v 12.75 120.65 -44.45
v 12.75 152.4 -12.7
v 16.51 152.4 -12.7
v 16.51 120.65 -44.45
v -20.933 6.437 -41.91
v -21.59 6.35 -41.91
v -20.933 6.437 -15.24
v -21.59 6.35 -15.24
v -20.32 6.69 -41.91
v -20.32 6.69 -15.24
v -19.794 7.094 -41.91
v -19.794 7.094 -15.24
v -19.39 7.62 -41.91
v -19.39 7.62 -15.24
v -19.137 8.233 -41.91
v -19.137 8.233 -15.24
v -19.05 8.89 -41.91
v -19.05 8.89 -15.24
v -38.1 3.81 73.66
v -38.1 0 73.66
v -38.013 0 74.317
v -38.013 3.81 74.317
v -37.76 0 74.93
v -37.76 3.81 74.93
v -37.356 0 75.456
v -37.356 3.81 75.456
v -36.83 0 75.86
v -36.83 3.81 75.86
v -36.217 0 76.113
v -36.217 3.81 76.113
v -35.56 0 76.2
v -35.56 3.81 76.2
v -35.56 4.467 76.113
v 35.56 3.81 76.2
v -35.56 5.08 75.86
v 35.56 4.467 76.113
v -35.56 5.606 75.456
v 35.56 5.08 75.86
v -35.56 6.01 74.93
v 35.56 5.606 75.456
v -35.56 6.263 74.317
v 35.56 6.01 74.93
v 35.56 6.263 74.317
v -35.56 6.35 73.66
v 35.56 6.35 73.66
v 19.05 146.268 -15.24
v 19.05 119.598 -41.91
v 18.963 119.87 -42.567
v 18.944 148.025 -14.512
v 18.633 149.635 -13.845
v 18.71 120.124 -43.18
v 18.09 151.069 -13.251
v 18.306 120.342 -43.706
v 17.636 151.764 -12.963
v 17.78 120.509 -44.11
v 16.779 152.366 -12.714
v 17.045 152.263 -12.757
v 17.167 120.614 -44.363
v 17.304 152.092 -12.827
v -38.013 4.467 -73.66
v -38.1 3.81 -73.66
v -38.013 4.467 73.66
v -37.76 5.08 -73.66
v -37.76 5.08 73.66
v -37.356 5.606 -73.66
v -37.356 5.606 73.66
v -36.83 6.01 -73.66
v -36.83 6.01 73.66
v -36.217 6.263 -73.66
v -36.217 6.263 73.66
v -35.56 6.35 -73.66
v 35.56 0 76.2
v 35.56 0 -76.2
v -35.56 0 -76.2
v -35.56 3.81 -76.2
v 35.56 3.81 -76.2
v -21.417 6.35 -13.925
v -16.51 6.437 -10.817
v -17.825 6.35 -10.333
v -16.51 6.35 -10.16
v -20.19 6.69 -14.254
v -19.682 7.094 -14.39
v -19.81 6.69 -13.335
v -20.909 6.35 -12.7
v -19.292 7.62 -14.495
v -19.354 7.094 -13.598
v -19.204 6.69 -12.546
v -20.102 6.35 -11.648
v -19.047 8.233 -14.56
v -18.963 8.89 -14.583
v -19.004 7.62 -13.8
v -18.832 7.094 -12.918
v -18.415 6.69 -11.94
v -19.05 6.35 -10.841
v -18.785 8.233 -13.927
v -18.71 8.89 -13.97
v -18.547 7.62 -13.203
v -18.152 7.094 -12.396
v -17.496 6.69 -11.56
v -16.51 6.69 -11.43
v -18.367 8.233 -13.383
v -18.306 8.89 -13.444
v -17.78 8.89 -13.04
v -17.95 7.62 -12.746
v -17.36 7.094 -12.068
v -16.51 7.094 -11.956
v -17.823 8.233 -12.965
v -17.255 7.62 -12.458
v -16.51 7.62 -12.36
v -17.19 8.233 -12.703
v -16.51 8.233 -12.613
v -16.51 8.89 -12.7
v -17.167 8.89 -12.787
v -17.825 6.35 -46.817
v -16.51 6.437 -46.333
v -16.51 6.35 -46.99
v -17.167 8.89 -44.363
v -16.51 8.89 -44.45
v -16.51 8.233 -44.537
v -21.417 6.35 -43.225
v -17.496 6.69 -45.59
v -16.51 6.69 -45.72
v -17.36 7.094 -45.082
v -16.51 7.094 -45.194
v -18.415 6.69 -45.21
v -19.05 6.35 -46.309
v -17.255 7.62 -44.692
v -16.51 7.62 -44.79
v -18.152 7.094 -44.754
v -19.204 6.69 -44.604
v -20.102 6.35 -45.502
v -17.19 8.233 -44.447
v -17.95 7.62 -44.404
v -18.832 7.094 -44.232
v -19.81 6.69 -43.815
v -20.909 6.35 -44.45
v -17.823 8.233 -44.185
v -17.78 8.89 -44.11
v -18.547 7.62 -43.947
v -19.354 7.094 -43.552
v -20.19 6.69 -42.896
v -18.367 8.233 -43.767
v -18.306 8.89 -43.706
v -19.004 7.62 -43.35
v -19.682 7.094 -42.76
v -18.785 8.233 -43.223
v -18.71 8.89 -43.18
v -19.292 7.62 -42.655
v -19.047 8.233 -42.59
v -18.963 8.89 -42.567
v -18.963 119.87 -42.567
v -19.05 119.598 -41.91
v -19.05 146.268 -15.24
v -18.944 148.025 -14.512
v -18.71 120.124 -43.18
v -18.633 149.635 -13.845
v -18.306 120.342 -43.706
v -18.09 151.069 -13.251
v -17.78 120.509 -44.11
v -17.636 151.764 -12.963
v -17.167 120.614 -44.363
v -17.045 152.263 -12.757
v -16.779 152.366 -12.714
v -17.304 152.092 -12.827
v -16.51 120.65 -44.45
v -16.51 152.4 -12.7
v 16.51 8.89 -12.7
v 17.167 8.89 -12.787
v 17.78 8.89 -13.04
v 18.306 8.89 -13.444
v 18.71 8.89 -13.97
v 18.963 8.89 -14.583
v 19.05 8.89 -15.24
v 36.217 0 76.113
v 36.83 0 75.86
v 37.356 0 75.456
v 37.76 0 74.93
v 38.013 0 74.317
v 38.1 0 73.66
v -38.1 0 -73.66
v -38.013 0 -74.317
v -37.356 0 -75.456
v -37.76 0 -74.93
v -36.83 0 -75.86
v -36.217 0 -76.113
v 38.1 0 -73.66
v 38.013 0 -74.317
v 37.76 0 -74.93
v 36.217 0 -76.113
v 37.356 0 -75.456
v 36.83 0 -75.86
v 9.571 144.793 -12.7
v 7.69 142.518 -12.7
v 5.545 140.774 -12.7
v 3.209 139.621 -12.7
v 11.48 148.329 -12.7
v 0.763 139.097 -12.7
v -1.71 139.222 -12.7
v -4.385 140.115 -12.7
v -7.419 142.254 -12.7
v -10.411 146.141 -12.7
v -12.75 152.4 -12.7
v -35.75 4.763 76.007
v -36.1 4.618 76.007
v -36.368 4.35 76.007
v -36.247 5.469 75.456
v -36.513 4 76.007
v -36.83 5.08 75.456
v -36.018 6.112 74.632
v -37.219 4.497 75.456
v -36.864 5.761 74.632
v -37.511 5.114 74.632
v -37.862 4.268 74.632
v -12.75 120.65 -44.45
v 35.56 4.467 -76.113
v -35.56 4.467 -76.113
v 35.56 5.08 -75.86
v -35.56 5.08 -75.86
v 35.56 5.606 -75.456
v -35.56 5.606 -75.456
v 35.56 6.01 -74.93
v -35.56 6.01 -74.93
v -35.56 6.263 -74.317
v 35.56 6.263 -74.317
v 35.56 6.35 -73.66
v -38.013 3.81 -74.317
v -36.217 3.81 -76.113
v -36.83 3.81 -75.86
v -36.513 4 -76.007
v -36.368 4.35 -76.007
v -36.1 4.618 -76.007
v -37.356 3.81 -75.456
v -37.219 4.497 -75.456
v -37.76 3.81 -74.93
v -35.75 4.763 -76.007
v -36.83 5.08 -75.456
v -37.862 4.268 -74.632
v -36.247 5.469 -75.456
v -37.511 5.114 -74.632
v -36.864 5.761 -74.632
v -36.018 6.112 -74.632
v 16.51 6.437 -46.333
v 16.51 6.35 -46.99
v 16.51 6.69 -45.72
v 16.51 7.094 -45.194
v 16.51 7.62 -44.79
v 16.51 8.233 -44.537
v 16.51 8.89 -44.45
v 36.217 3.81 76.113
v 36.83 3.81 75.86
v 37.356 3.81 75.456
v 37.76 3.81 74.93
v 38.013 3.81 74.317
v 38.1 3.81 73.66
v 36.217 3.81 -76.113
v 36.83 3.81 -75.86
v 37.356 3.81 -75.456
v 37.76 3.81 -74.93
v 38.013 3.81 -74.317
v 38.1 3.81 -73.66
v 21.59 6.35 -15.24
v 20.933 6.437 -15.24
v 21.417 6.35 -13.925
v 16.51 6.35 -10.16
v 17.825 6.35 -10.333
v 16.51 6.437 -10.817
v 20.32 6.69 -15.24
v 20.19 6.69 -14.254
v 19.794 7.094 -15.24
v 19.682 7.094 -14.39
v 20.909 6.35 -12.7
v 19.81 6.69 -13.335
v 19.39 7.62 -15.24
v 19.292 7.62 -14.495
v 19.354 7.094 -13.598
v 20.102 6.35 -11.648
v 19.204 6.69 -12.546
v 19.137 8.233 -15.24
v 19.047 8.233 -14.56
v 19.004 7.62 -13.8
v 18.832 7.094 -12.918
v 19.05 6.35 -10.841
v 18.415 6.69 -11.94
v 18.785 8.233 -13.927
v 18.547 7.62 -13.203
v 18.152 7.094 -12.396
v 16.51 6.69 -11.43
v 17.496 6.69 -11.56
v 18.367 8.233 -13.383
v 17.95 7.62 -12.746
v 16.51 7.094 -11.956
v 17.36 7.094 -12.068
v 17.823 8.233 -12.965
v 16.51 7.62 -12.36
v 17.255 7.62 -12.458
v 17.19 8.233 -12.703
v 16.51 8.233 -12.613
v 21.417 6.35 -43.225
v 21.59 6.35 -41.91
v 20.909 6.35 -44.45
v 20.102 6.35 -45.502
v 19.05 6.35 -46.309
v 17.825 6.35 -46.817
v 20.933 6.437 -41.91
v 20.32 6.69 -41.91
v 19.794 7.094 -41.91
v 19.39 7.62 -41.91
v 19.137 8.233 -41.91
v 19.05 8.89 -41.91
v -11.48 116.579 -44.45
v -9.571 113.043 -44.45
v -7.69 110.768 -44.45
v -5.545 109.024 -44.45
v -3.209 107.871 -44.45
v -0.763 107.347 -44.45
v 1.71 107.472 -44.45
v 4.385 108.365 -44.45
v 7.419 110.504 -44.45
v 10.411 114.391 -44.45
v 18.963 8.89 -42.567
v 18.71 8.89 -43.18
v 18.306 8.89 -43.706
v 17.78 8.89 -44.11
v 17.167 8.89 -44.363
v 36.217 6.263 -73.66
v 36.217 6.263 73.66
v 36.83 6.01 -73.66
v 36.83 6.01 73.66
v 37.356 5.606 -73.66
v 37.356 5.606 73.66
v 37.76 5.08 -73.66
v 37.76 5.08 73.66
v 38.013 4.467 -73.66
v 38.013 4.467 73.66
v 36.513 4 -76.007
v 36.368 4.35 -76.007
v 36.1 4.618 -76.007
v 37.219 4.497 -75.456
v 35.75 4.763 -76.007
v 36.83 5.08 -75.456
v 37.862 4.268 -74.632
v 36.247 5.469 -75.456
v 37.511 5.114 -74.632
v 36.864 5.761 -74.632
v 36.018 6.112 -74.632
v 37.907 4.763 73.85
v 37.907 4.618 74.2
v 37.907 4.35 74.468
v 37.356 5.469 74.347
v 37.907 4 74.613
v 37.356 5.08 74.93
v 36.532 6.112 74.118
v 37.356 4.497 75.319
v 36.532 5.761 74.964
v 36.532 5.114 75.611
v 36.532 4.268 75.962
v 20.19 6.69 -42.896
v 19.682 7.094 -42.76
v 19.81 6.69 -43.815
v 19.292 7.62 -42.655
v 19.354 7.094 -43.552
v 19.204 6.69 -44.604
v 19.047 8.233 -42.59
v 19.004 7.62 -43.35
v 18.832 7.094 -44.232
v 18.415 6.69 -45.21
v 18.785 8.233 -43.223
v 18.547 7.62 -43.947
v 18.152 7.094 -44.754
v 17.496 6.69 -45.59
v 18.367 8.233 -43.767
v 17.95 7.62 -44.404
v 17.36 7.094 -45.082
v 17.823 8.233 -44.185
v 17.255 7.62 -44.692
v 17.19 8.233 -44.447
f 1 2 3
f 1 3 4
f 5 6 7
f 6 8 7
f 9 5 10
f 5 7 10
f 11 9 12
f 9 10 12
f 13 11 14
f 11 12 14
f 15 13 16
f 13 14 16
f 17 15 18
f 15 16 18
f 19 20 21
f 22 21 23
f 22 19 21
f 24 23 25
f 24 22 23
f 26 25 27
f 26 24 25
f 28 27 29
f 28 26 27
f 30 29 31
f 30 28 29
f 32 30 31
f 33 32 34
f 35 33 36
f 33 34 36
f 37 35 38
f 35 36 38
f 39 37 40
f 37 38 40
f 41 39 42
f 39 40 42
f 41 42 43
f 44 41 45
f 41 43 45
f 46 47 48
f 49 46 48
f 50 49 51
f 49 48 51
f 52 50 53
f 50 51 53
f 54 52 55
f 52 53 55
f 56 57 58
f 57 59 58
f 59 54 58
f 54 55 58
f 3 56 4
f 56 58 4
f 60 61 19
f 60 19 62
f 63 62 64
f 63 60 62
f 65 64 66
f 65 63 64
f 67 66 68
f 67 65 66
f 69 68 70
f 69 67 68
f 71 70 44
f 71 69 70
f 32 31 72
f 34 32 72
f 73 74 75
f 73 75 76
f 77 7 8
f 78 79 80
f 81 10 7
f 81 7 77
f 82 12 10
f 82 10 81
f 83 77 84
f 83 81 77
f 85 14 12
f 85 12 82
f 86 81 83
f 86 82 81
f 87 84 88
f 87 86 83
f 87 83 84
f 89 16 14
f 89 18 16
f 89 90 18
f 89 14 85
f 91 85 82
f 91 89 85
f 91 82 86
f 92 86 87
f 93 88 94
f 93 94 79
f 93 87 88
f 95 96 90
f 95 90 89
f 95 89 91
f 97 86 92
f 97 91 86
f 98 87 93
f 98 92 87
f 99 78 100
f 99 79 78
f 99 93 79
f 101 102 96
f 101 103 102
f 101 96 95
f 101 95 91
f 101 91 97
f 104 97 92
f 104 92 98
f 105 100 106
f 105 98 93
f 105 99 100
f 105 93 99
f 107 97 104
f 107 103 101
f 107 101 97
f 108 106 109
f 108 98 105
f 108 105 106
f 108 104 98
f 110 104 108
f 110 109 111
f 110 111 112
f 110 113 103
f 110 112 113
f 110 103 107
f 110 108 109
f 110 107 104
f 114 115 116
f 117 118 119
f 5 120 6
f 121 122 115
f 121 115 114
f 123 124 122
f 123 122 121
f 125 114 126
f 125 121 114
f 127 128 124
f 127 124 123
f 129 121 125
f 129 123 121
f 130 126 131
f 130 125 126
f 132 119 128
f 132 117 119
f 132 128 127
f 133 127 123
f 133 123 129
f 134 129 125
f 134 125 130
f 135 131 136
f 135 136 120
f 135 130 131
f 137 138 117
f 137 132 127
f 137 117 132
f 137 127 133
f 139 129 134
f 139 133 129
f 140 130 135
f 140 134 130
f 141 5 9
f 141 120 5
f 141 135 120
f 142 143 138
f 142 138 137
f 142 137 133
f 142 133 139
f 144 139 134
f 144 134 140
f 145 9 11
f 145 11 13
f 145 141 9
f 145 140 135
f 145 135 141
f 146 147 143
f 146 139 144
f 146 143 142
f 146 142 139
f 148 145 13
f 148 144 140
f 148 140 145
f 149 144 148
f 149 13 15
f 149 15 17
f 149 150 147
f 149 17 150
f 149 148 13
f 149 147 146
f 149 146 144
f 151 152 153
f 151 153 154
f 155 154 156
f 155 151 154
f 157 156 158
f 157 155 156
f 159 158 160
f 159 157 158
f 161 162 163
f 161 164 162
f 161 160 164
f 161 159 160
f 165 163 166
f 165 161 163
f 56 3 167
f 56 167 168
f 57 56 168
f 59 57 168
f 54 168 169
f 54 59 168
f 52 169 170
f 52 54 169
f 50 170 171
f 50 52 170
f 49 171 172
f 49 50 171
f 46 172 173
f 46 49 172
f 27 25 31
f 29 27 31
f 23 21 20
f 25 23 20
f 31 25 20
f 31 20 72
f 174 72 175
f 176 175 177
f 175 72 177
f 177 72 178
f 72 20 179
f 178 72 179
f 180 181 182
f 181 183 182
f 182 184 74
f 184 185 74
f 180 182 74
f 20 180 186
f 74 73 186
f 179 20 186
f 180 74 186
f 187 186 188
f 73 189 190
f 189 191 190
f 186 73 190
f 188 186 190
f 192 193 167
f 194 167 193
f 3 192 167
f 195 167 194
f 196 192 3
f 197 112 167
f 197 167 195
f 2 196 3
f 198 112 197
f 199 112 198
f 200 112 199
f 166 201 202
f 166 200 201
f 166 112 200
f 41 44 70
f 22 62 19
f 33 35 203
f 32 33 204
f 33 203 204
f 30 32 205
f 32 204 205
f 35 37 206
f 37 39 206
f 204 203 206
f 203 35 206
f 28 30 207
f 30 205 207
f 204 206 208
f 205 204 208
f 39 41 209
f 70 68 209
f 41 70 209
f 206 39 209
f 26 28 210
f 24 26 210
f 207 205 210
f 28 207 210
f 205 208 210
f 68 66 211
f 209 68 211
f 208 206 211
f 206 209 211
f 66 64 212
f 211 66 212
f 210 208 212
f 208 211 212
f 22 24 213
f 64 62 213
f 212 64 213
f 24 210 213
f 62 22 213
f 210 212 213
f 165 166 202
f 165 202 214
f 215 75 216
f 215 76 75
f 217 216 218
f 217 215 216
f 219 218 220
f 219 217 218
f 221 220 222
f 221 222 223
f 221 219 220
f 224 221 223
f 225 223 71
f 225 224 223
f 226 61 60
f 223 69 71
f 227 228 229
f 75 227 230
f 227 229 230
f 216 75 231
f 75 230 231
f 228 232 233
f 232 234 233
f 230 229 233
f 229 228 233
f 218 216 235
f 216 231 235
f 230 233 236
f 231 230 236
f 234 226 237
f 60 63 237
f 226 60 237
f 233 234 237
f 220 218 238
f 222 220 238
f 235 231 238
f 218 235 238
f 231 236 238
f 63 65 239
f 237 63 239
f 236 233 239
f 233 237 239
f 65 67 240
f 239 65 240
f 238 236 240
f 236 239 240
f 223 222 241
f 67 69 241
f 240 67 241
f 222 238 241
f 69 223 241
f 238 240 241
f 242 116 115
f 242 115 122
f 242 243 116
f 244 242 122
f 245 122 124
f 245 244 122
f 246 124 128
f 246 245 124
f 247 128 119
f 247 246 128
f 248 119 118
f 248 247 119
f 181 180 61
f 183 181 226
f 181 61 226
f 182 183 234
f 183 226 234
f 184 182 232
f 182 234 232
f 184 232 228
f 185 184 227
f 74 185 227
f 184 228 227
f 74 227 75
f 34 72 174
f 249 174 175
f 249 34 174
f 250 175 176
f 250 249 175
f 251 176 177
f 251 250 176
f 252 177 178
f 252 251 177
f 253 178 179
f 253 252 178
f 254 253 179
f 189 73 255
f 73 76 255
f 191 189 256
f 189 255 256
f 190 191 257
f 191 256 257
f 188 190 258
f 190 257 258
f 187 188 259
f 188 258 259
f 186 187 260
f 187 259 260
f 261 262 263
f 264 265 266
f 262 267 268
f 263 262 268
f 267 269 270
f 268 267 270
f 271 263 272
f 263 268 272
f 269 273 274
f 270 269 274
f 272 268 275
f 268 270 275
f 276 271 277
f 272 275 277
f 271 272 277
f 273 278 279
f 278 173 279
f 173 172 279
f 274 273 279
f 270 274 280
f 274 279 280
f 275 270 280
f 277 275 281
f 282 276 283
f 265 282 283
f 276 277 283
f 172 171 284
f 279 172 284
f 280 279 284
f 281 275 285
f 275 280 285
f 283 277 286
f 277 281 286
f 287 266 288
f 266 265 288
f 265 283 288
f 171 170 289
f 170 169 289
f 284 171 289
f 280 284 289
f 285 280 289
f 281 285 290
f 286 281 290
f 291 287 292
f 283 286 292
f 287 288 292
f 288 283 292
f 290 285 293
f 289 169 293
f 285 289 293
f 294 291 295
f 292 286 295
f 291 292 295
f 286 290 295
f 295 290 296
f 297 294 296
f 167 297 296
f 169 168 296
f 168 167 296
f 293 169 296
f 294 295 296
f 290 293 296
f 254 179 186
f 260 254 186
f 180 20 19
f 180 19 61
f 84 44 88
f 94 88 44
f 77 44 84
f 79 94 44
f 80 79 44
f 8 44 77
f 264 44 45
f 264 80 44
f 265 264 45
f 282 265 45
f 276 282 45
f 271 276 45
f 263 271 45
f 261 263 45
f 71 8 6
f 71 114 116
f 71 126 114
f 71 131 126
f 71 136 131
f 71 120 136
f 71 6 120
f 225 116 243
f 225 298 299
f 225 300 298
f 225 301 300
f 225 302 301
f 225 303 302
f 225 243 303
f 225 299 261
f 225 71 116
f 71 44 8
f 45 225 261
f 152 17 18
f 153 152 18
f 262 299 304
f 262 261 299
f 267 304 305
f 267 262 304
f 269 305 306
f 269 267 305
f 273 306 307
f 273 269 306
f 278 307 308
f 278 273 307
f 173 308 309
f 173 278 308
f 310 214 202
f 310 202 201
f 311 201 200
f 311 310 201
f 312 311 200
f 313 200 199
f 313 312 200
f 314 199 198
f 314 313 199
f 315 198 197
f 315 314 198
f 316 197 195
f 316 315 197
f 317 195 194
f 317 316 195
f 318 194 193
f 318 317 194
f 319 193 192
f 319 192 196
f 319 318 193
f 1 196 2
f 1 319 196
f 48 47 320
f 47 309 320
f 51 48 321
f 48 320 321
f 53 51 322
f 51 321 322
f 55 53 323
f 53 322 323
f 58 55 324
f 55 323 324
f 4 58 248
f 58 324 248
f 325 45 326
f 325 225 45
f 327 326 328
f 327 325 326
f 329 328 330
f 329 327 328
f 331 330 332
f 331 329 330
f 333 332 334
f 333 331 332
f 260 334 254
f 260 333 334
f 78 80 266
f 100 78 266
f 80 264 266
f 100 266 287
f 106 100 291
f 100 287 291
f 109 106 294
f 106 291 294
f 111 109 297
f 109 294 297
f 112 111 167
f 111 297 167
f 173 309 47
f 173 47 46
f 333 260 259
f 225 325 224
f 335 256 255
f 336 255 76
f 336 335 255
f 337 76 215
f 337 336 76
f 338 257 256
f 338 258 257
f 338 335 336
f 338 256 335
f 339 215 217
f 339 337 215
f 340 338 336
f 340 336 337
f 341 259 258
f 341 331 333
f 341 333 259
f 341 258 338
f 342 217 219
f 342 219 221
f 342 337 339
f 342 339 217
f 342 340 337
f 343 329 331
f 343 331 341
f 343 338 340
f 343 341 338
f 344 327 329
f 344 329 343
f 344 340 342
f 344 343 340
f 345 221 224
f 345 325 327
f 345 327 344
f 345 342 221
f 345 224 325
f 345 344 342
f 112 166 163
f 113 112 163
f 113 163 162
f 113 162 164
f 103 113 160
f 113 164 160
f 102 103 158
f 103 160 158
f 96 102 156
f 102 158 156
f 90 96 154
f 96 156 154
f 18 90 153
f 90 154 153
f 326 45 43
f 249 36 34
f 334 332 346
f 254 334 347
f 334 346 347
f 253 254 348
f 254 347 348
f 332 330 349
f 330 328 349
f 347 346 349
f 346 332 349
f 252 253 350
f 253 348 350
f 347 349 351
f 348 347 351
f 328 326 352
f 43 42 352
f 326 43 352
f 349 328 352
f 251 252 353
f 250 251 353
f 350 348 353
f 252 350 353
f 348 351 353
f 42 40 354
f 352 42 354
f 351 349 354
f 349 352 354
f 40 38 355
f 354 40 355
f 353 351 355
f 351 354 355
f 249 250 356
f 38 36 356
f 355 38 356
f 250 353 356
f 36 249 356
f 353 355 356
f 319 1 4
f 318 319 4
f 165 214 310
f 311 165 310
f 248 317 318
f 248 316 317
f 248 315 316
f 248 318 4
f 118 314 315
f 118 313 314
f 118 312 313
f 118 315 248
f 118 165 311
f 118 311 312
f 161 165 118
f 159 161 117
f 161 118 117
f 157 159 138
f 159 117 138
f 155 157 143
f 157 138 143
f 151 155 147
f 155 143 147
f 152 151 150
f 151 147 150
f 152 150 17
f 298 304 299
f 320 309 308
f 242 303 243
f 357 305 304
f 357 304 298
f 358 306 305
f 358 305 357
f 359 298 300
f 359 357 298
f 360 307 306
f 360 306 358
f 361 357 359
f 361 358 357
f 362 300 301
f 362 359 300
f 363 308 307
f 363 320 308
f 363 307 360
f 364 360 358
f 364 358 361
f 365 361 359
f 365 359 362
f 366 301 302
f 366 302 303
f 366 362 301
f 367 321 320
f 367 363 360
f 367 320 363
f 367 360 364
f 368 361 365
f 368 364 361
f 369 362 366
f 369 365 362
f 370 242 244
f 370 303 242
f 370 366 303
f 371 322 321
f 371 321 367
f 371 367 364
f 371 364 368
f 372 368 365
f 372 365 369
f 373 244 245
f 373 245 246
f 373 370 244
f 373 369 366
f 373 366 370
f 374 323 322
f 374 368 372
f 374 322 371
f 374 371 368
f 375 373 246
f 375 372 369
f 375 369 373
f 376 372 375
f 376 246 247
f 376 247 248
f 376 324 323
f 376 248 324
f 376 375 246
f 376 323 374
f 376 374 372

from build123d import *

# Parameters (mm, degrees)
SKETCH1_W                = 76.2
SKETCH1_H                = 152.4
BOSS_EXTRUDE1_DEPTH      = 6.35
BOSS_EXTRUDE2_DEPTH      = 19.05
BOSS_EXTRUDE2_DEPTH_BACK = 19.05
SKETCH4_R                = 13.335
CUT_EXTRUDE1_DEPTH       = 175.596133978
FILLET1_R                = 2.54


with BuildPart() as part:
    # Sketch1 → Boss-Extrude1 (new body)
    with BuildSketch(Plane(origin=(0, 0, 0), x_dir=(1, 0, 0), z_dir=(0, 1, 0))):
        Rectangle(SKETCH1_W, SKETCH1_H)
    extrude(amount=BOSS_EXTRUDE1_DEPTH)

    # Sketch3 → Boss-Extrude2 (add, two sides: drawn at the far end of the back side and taken through both)
    with BuildSketch(Plane(origin=(0, 0, 0), x_dir=(0, 0, -1), z_dir=(1, 0, 0)).offset(-BOSS_EXTRUDE2_DEPTH_BACK)):
        Polygon((12.7, 6.35), (12.7, 152.4), (44.45, 120.65), (44.45, 6.35), align=None)
    extrude(amount=BOSS_EXTRUDE2_DEPTH + BOSS_EXTRUDE2_DEPTH_BACK)

    # Sketch4 → Cut-Extrude1 (cut, through all)
    with BuildSketch(Plane(origin=(0, 0, 0), x_dir=(1, 0, 0), z_dir=(0, 0.7071067811865486, 0.7071067811865465))):
        with Locations((0, 120.65)):
            Circle(SKETCH4_R)
    extrude(amount=CUT_EXTRUDE1_DEPTH, mode=Mode.SUBTRACT)

    # Fillet1
    fillet1_edges = [part.edges().sort_by_distance(p)[0] for p in [
        (-38.1, 6.35, 0),
        (0, 6.35, -44.45),
        (-19.05, 6.35, -28.575),
        (0, 6.35, -12.7),
        (19.05, 79.375, -12.7),
        (19.05, 136.525, -28.575),
        (0, 6.35, 76.2),
        (19.05, 63.5, -44.45),
        (-19.05, 79.375, -12.7),
        (-19.05, 136.525, -28.575),
        (-19.05, 63.5, -44.45),
        (19.05, 6.35, -28.575),
        (38.1, 6.35, 0),
        (38.1, 3.175, 76.2),
        (-38.1, 3.175, 76.2),
        (-38.1, 3.175, -76.2),
        (38.1, 3.175, -76.2),
        (0, 6.35, -76.2),
    ]]
    fillet(fillet1_edges, radius=FILLET1_R)


solid = part.part
